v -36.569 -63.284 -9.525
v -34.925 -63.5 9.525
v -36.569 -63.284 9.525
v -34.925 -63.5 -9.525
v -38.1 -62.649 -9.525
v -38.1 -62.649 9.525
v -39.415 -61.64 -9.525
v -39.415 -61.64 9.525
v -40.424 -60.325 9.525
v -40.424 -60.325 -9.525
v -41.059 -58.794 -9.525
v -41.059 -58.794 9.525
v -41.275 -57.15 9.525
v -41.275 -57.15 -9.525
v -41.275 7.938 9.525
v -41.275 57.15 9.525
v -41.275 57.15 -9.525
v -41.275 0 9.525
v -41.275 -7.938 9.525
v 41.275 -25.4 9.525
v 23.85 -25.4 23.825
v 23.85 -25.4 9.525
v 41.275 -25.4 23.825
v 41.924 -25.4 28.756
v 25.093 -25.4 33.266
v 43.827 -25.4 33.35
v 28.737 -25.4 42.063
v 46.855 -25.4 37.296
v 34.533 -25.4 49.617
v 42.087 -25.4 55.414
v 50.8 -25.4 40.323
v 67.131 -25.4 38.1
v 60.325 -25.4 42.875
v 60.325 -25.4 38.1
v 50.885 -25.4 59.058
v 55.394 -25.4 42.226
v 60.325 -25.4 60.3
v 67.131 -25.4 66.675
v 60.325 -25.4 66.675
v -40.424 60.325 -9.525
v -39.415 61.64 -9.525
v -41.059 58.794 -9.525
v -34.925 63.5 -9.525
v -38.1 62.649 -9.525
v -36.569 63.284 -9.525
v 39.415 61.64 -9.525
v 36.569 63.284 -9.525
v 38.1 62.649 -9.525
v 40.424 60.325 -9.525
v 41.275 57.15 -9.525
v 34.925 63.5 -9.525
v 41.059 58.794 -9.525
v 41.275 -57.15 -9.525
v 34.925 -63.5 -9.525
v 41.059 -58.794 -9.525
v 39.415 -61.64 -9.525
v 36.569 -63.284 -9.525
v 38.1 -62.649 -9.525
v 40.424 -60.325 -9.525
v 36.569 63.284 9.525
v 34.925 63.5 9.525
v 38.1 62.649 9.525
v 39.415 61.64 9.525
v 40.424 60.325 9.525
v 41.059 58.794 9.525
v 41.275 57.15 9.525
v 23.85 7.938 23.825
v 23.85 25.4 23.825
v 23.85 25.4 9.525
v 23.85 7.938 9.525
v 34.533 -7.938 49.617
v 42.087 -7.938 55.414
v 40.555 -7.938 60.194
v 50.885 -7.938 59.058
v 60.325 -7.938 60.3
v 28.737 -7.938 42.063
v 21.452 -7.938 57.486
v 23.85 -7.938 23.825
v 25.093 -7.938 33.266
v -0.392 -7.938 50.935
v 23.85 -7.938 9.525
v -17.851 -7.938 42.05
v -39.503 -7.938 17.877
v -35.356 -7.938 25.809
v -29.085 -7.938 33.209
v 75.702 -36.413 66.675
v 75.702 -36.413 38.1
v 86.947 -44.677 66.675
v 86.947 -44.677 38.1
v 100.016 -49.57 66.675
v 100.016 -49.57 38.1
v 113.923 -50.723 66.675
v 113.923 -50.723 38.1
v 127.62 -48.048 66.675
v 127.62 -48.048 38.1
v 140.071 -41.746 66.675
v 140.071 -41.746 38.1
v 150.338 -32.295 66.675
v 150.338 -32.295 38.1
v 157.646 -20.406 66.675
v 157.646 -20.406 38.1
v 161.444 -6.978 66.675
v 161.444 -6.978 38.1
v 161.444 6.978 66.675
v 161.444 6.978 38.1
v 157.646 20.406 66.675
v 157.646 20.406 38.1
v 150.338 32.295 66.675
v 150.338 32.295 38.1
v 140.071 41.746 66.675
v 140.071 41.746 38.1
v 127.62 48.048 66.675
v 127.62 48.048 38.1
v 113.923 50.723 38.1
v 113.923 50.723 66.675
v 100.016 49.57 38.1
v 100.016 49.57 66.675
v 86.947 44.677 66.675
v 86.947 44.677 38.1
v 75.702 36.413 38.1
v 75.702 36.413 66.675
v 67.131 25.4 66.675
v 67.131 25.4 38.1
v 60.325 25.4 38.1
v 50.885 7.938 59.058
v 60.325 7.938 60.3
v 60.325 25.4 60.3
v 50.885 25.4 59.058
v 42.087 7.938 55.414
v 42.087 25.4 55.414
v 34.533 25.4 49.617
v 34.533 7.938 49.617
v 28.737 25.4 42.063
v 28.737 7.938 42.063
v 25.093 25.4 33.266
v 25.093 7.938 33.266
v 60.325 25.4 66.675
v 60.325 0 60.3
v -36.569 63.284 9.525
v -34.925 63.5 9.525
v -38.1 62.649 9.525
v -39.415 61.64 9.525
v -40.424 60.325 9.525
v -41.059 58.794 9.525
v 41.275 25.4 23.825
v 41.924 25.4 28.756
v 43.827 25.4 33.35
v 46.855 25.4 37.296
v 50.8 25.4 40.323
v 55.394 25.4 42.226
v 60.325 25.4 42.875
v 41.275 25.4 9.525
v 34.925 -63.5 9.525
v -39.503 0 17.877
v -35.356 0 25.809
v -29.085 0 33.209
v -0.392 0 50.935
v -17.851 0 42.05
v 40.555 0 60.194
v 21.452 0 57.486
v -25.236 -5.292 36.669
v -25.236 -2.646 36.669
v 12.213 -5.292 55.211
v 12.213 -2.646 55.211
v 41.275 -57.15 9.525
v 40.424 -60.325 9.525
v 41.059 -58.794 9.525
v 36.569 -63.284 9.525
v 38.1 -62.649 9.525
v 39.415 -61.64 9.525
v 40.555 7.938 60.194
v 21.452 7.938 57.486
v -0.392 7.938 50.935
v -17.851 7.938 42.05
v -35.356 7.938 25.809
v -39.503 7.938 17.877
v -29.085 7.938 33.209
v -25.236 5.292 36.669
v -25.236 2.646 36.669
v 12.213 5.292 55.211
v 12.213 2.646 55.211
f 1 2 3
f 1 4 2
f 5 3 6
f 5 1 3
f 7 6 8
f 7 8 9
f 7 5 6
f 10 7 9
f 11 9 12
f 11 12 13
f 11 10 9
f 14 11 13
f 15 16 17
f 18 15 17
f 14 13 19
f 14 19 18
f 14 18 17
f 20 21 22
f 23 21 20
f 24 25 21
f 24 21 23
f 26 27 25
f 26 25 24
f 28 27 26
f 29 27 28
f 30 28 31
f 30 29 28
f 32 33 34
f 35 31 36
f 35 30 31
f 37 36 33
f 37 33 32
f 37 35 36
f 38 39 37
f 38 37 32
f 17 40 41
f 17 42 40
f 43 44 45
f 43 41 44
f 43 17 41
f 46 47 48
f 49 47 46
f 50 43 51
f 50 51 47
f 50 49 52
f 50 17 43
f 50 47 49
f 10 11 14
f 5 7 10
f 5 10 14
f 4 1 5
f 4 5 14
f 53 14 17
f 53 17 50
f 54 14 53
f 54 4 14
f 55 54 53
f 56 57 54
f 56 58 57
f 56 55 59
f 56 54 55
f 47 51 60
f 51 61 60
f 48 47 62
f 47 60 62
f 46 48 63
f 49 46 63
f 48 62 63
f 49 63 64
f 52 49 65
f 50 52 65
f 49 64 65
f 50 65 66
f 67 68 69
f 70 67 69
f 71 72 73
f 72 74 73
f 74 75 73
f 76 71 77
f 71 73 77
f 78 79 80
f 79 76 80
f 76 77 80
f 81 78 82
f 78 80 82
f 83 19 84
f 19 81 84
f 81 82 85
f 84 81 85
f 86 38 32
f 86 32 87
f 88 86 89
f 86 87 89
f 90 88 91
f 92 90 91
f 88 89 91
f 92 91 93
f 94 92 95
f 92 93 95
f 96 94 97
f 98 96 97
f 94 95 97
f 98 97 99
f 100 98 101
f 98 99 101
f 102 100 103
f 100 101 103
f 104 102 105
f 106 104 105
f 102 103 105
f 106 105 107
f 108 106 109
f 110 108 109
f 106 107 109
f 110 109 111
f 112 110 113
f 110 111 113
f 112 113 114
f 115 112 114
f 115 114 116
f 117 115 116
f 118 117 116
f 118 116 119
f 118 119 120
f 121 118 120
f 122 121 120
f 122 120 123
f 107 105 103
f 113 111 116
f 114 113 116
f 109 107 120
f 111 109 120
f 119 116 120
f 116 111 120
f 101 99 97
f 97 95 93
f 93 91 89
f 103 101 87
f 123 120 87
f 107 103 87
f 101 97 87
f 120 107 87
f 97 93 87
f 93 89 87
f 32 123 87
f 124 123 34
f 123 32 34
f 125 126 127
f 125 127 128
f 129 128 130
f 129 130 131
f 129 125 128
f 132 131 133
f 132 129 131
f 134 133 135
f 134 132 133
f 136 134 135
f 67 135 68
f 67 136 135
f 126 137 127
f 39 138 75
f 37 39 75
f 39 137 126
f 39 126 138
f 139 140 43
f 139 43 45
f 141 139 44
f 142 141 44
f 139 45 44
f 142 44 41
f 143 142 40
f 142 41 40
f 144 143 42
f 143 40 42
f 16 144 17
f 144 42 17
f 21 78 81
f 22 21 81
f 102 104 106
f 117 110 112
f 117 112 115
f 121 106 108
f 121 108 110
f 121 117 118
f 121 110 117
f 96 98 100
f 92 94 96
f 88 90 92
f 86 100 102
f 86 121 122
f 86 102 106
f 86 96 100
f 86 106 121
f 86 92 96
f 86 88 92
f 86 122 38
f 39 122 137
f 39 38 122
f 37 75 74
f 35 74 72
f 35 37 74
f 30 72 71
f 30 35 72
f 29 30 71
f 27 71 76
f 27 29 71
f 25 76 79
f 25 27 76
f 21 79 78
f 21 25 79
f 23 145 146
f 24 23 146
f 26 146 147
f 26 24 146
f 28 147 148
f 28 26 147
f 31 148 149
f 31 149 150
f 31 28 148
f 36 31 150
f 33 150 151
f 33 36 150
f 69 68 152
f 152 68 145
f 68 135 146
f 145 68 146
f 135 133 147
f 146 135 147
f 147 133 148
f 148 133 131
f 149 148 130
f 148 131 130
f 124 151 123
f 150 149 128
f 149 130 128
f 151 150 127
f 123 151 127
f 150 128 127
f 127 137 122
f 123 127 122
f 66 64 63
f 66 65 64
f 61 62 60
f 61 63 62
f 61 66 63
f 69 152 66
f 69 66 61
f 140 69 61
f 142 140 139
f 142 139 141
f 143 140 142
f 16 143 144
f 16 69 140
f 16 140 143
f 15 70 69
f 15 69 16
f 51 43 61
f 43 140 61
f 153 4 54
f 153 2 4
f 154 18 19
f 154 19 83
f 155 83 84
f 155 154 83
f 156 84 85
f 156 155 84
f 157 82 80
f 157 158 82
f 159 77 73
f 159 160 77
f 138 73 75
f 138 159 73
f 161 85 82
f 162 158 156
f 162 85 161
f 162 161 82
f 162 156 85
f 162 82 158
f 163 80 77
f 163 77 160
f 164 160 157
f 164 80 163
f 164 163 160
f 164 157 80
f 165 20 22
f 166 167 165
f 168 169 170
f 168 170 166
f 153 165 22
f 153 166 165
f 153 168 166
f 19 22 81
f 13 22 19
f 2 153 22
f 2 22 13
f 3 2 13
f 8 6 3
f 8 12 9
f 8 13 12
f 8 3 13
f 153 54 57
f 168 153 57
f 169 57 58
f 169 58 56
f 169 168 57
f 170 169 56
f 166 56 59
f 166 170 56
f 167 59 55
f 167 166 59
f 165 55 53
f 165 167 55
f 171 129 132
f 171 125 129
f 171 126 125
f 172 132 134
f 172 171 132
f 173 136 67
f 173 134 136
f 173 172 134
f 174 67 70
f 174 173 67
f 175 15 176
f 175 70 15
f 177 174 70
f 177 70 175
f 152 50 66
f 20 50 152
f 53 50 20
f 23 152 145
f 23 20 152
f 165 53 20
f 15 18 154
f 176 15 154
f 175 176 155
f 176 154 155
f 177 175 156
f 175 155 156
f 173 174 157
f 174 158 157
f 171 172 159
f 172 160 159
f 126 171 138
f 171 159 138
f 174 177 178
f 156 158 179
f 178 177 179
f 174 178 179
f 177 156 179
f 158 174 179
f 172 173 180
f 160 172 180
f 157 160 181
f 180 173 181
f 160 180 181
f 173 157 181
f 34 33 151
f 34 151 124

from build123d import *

# Parameters (mm, degrees)
F1_DEPTH = 63.5
F2_DEPTH = 25.4
F3_DEPTH = 7.9375
F5_R     = 6.35


with BuildPart() as f1:
    # F0 (on Front) → F1 (new body, symmetric)
    with BuildSketch(Plane.XZ):
        Polygon((23.849781, 9.525), (-41.275, 9.525), (-41.275, -9.525), (41.275, -9.525), (41.275, 9.525), align=None)
    extrude(amount=F1_DEPTH, both=True)

    # F0 (on Front) → F2 (join, symmetric)
    with BuildSketch(Plane.XZ):
        with BuildLine():
            Line((23.849781, 23.8252), (23.849781, 9.525))
            Line((23.849781, 9.525), (41.275, 9.525))
            Line((41.275, 9.525), (41.275, 23.8252))
            ThreePointArc((41.275, 23.8252), (46.854616, 37.295584), (60.325, 42.8752))
            Line((60.325, 42.8752), (60.325, 60.300419))
            ThreePointArc((60.325, 60.300419), (34.533125, 49.617075), (23.849781, 23.8252))
        make_face()
        Polygon((60.325, 66.675), (60.325, 60.300419), (60.325, 42.8752), (60.325, 38.1), (111.125, 38.1), (111.125, 66.675), align=None)
    extrude(amount=F2_DEPTH, both=True)

    # F0 (on Front) → F3 (join, symmetric)
    with BuildSketch(Plane.XZ):
        with BuildLine():
            add(Edge.make_bspline(
                [(-41.275, 9.525), (-39.523579, 39.352842), (10.464912, 63.553624), (60.325, 60.300419)],
                knots=[0, 0, 0, 0, 113.581263, 113.581263, 113.581263, 113.581263], degree=3))
            Line((-41.275, 9.525), (23.849781, 9.525))
            Line((23.849781, 9.525), (23.849781, 23.8252))
            ThreePointArc((23.849781, 23.8252), (34.533125, 49.617075), (60.325, 60.300419))
        make_face()
    extrude(amount=F3_DEPTH, both=True)

    # F0 (on Front) → F4 (revolve)
    with BuildSketch(Plane.XZ):
        Polygon((60.325, 66.675), (60.325, 60.300419), (60.325, 42.8752), (60.325, 38.1), (111.125, 38.1), (111.125, 66.675), align=None)
    revolve(axis=Axis((111.125, 0, 52.3875), (0, 0, 1)))

    # F5
    f5_edges = [f1.edges().sort_by_distance(p)[0] for p in [
        (41.275, -63.5, 0),
        (-41.275, -63.5, 0),
        (41.275, 63.5, 0),
        (-41.275, 63.5, 0),
    ]]
    fillet(f5_edges, radius=F5_R)


solid = f1.part
